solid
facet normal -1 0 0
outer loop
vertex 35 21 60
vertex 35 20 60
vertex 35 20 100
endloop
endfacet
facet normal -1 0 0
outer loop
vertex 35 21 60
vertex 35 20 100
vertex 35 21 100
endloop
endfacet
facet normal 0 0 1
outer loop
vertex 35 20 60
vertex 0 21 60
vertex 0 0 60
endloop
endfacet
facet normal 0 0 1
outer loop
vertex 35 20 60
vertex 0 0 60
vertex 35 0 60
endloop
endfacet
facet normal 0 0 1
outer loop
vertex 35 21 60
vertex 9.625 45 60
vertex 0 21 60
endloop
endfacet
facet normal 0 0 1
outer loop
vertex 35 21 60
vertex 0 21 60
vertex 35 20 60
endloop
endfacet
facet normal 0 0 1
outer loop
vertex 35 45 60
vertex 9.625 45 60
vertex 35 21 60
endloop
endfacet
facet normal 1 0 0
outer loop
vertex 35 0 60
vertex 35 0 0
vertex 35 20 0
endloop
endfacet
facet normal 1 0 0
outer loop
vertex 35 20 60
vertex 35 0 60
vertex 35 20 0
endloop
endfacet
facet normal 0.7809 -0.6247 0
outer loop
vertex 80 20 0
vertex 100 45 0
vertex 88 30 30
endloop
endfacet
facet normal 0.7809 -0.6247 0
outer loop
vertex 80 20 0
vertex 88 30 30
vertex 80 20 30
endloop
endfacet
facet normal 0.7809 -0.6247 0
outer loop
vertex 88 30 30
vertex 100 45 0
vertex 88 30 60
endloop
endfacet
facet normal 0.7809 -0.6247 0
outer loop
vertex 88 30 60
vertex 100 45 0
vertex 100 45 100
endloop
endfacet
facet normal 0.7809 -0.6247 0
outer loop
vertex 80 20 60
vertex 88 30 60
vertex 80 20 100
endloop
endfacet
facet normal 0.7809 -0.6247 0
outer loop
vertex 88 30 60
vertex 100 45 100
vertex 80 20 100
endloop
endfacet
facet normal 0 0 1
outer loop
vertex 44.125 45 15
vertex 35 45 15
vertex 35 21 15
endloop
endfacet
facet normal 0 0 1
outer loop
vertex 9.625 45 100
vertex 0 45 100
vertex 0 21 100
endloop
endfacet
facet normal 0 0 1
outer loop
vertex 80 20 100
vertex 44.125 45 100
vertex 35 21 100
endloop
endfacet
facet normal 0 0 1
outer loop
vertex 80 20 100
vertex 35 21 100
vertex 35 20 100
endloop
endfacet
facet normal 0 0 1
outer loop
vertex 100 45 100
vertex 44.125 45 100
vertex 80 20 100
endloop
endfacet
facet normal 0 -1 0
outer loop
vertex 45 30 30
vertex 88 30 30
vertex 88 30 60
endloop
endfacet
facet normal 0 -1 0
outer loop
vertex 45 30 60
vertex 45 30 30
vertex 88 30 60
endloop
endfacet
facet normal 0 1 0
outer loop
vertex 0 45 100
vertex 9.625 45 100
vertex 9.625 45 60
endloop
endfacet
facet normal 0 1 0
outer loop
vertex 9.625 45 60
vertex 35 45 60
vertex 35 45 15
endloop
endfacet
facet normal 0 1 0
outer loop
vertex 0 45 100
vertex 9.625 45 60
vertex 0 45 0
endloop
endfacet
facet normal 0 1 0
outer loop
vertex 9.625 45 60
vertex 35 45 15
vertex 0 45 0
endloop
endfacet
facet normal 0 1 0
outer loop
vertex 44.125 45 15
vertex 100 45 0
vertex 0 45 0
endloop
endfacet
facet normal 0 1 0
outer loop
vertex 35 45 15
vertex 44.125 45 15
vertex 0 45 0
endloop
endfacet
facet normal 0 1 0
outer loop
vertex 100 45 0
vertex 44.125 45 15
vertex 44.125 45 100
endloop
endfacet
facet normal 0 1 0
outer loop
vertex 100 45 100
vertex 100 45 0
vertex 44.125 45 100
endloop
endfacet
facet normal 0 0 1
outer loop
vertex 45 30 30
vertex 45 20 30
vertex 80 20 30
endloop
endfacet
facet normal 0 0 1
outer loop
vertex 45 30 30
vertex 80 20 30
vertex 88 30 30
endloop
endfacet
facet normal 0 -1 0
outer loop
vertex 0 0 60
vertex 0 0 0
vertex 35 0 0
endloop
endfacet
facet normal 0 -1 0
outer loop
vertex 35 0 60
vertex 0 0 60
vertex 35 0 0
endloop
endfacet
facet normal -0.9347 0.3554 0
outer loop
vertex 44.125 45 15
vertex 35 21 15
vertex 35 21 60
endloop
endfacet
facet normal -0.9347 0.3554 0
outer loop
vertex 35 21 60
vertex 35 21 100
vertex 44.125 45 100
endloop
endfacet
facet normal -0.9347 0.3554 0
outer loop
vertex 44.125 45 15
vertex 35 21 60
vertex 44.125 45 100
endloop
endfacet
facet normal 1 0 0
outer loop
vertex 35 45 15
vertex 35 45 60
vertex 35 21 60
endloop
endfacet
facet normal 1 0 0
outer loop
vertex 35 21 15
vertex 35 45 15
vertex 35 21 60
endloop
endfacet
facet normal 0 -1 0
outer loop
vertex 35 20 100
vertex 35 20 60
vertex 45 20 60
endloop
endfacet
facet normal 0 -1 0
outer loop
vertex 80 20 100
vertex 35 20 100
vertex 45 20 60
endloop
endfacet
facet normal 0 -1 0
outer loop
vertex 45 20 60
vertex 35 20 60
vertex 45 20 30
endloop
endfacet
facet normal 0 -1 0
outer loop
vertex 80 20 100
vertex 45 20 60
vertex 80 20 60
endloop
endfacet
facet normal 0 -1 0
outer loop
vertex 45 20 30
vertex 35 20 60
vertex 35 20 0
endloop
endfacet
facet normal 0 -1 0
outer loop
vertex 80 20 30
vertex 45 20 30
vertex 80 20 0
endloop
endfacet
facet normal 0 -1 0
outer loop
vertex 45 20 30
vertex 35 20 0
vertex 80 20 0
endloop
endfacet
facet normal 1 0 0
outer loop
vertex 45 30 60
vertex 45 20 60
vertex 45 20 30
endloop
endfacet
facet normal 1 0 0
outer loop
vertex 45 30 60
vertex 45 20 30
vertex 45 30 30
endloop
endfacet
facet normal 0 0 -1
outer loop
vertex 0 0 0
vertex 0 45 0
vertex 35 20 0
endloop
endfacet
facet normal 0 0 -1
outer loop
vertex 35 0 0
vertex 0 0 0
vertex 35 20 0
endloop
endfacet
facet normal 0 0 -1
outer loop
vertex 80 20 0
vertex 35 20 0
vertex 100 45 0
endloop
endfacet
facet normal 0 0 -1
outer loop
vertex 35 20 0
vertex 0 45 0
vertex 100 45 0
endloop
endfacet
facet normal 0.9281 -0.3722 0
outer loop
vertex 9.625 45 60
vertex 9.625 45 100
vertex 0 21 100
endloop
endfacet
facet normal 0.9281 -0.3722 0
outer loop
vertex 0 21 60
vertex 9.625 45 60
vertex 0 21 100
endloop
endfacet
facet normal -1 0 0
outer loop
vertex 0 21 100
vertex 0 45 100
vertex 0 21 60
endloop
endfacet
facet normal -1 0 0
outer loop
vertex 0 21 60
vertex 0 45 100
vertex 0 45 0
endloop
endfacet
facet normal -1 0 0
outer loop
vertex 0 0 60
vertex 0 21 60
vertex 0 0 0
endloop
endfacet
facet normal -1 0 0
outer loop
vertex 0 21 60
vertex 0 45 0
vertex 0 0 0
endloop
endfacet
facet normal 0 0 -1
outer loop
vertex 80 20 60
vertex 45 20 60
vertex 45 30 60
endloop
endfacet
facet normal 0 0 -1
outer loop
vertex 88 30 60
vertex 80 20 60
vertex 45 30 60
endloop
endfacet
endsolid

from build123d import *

# Parameters (mm, degrees)
F0_W     = 65
F0_H     = 25
F1_DEPTH = 100
F4_DEPTH = 40
F5_DEPTH = 85
F6_W     = 10
F6_H     = 30
F7_DEPTH = 55
F9_DEPTH = 100.001


with BuildPart() as f1:
    # F0 (on Top) → F1 (new body)
    with BuildSketch(Plane.XY):
        Polygon((0, 45), (0, 0), (35, 0), (35, 20), (35, 45), align=None)
        with Locations((67.5, 32.5)):
            Rectangle(F0_W, F0_H)
    extrude(amount=F1_DEPTH)

    # F2 (on face) → F4 (cut, through all)
    with BuildSketch(Plane.XY.offset(100)):
        Polygon((35, 0), (35, 20), (35, 21), (35, 45), (9.6249980852, 45), (0, 21), (0, 0), align=None)
    extrude(amount=-F4_DEPTH, mode=Mode.SUBTRACT)

    # F2 (on face) → F5 (cut)
    with BuildSketch(Plane.XY.offset(100)):
        Polygon((35, 45), (35, 21), (44.124994427, 45), align=None)
    extrude(amount=-F5_DEPTH, mode=Mode.SUBTRACT)

    # F6 (on face) → F7 (cut)
    with BuildSketch(Plane.YZ.offset(100)):
        with Locations((25, 45)):
            Rectangle(F6_W, F6_H)
    extrude(amount=-F7_DEPTH, mode=Mode.SUBTRACT)

    # F8 (on face) → F9 (cut, through all)
    with BuildSketch(Plane.XY.offset(100)):
        Polygon((100, 20), (100, 45), (80, 20), align=None)
    extrude(amount=-F9_DEPTH, mode=Mode.SUBTRACT)


solid = f1.part
